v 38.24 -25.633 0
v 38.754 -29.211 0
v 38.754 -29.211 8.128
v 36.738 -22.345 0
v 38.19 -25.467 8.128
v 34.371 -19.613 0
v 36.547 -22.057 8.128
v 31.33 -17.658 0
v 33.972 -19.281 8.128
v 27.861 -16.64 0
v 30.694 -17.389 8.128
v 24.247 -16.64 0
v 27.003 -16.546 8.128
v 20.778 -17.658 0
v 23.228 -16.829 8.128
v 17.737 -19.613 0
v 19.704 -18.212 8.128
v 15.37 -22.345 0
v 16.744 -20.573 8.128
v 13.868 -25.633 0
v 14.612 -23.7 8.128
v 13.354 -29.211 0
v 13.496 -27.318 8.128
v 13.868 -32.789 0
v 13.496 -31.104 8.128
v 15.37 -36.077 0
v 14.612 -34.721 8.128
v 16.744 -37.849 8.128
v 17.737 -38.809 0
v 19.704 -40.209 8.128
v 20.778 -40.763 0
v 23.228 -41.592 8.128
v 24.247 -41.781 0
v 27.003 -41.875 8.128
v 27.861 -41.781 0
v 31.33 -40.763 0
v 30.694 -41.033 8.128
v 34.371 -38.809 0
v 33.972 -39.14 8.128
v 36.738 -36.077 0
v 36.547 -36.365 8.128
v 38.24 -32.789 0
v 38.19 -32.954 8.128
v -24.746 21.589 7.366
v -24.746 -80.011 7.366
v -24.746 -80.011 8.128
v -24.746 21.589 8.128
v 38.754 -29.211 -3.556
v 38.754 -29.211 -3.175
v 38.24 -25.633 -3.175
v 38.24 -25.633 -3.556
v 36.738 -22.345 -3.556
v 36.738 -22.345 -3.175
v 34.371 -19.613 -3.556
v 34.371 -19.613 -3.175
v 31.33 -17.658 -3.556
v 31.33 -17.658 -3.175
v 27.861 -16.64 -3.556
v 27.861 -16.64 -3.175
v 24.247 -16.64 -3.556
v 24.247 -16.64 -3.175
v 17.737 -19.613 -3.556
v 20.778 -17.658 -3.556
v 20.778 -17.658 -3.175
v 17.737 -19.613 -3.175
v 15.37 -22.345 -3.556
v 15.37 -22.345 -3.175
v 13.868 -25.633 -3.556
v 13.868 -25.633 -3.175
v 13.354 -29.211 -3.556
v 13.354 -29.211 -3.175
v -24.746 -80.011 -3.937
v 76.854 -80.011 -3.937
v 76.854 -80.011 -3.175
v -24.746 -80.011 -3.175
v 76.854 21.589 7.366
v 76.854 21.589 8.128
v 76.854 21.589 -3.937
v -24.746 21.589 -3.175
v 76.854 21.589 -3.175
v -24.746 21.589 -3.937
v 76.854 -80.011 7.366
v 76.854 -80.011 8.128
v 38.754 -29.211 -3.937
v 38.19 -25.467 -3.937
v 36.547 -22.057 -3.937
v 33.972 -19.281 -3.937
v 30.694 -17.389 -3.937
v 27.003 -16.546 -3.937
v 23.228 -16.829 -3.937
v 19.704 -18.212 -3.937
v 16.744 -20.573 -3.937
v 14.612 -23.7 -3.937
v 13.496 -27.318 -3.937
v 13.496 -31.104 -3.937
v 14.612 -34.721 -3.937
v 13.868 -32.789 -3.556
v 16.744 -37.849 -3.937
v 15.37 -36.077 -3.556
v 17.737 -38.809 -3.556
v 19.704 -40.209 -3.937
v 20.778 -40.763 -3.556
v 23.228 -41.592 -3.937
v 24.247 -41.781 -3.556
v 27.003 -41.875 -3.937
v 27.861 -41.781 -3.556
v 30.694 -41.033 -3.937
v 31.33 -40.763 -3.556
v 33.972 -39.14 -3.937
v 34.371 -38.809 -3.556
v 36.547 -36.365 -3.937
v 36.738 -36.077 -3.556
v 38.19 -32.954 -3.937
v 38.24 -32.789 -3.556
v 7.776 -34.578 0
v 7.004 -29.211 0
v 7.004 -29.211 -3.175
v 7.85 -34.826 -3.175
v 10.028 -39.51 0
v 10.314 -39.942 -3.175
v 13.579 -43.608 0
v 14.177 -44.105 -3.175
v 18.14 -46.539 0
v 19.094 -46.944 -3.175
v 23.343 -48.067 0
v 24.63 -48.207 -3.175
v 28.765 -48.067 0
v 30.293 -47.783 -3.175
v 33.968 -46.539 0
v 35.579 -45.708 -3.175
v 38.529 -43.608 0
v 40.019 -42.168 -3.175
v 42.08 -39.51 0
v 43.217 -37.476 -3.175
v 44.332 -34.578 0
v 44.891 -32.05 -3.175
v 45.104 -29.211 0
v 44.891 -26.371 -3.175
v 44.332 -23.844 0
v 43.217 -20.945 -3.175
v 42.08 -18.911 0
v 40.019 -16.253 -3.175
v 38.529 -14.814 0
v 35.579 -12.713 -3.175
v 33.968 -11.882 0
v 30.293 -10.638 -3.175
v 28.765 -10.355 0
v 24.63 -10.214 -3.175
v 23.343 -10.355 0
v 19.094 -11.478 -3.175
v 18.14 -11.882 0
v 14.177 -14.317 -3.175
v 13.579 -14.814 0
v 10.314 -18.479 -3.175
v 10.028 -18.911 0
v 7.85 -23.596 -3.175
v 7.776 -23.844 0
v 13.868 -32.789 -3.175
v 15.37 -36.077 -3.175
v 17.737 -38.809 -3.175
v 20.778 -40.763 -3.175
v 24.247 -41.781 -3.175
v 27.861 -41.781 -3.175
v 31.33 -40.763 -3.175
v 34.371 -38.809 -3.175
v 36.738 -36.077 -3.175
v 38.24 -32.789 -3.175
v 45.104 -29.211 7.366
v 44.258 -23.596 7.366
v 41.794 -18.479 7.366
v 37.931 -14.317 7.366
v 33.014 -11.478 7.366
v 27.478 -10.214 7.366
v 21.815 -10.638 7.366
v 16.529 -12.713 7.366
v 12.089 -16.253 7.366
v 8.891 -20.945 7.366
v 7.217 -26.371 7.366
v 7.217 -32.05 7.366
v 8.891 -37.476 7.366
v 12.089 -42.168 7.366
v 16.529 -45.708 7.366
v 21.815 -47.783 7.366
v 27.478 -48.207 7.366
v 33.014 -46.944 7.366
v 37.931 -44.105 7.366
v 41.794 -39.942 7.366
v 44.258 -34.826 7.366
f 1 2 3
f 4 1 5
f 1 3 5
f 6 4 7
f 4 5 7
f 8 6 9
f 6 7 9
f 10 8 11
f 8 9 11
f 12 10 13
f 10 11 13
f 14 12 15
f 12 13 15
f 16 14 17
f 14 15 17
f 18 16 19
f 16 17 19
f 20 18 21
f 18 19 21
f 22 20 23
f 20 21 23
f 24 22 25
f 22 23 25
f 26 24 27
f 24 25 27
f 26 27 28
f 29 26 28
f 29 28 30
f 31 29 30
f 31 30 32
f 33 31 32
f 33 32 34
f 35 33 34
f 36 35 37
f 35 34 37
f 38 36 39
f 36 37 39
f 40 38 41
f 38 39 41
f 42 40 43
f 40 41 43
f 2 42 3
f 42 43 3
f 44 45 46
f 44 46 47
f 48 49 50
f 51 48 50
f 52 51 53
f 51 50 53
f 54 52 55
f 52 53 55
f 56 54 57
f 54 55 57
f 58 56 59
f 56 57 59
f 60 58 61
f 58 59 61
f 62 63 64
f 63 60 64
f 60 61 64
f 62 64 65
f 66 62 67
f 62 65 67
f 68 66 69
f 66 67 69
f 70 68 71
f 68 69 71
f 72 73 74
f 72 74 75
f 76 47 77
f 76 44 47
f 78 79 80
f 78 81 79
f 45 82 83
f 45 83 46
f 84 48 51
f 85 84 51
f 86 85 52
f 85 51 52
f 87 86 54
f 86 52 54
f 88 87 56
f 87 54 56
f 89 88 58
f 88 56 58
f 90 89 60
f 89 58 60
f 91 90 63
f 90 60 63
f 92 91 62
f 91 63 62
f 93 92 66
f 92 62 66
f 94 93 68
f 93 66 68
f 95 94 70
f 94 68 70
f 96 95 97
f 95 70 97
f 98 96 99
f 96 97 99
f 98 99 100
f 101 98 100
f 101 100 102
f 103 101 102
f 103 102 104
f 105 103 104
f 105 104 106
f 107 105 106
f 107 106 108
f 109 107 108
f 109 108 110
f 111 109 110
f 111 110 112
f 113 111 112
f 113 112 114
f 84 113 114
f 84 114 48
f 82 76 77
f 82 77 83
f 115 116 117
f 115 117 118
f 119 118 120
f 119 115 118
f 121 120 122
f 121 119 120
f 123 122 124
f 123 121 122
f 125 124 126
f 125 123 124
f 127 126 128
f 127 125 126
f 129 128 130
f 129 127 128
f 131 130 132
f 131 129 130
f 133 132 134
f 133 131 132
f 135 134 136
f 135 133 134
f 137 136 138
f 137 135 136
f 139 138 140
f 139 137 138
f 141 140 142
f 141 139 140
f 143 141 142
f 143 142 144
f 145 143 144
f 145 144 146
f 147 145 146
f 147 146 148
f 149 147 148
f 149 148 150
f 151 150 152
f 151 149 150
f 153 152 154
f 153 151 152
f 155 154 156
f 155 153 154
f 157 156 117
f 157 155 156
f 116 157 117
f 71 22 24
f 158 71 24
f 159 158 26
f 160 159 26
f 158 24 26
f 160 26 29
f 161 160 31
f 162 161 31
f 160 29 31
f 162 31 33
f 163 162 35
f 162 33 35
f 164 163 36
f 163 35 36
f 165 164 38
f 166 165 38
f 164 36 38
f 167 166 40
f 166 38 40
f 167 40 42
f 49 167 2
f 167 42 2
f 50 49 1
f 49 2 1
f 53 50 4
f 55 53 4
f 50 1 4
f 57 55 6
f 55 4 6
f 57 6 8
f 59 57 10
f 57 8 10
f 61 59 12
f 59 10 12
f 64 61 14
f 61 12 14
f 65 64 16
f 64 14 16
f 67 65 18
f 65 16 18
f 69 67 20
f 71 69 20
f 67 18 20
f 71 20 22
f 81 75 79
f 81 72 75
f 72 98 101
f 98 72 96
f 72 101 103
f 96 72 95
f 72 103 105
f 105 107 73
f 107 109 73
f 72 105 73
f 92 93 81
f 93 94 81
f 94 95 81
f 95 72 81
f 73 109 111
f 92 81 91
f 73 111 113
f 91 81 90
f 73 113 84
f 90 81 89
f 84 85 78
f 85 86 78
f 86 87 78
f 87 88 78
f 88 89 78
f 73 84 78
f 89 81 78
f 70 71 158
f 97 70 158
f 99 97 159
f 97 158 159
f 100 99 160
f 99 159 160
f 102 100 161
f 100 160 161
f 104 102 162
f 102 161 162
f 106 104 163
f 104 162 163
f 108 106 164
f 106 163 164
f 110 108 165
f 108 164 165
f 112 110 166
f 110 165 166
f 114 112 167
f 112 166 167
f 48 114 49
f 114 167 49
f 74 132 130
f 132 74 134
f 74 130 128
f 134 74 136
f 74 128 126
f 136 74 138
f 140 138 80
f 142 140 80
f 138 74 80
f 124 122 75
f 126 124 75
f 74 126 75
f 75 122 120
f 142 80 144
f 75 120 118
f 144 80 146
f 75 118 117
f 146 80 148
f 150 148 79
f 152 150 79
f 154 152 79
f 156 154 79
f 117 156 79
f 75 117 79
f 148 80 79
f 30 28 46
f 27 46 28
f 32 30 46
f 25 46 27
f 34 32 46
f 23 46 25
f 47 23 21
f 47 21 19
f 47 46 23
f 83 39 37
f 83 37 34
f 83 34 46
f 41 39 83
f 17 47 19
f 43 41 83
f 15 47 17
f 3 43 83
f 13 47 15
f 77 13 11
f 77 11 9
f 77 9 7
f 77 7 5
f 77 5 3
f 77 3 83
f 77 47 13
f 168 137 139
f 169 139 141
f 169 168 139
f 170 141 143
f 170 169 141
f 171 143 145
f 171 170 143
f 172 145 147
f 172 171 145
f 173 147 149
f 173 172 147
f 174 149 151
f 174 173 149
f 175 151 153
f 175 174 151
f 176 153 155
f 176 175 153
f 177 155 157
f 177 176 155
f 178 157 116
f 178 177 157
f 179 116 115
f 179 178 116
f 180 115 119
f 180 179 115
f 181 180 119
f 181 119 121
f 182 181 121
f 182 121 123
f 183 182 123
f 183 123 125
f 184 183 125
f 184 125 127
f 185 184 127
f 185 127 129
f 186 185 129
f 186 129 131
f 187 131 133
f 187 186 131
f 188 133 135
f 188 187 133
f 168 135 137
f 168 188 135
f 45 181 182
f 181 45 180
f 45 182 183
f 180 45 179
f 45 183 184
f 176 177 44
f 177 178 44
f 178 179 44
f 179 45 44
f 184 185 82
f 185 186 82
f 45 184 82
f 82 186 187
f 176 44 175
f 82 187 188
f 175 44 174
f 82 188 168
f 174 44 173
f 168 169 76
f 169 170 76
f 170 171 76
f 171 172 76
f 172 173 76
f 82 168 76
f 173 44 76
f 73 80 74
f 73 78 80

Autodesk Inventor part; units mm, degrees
ref_plane "YZ Plane" through (0, 0, 0) normal (1, 0, 0) x (0, 1, 0)
ref_plane "XZ Plane" through (0, 0, 0) normal (0, 1, 0) x (-1, 0, 0)
ref_plane "XY Plane" through (0, 0, 0) normal (0, 0, 1) x (1, 0, 0)
sketch "Sketch1" plane through (0, 0, 0) normal (0, 0, 1) x (1, 0, 0)
  line L0 (-24.746, 21.5893) -> (76.854, 21.5893)
  line L1 (76.854, 21.5893) -> (76.854, -80.0107)
  line L2 (76.854, -80.0107) -> (-24.746, -80.0107)
  line L3 (-24.746, -80.0107) -> (-24.746, 21.5893)
  line L4 (-24.746, 21.5893) -> (76.854, -80.0107)
  line L5 (76.854, 21.5893) -> (-24.746, -80.0107)
  circle A0 centre (26.054, -29.2107) radius 12.7
  point P0 (0, 0)
  dimension "d0" = 101.6
  dimension "d1" = 101.6
  dimension "d2" = 25.4
extrude "Extrusion1" add sketch "Sketch1" along normal blind 8.128 and the other way blind 3.937
sketch "Sketch2" plane through (0, 0, 8.128) normal (0, 0, 1) x (1, 0, 0)
  line L0 (-24.746, 21.5893) -> (76.854, -80.0107)
  line L1 (76.854, 21.5893) -> (-24.746, -80.0107)
  circle A0 centre (26.054, -29.2107) radius 12.7
  point P0 (0, 0)
  dimension "d7" = 25.4
extrude "Extrusion2" cut sketch "Sketch2" against normal blind 8.128
sketch "Sketch3" plane through (-24.746, 21.5893, 8.128) normal (0, 1, 0) x (1, 0, 0)
  line L0 (101.6, 12.065) -> (101.6, 0) projected
  line L1 (101.6, 12.065) -> (0, 12.065) projected
  line L2 (0, 0) -> (0, 12.065) projected
  line L3 (0, 12.065) -> (101.6, 12.065)
  line L4 (101.6, 12.065) -> (101.6, 11.303)
  line L5 (101.6, 11.303) -> (0, 11.303)
  line L6 (0, 11.303) -> (0, 12.065)
  line L7 (101.6, 0) -> (0, 0)
  line L8 (0, 0) -> (0, 0.762)
  line L9 (0, 0.762) -> (101.6, 0.762)
  line L10 (101.6, 0.762) -> (101.6, 0)
  line L11 (0, 0.762) -> (0, 11.303)
  line L12 (101.6, 12.065) -> (101.6, 0.762)
  point P0 (24.746, 8.128)
  dimension "d10" = 0.762
  dimension "d11" = 0.762
extrude "Extrusion3" cut sketch "Sketch3" against normal blind 101.6 contours L0 L9 L2 L5
sketch "Sketch4" plane through (0, 0, 8.128) normal (0, 0, 1) x (1, 0, 0)
  circle A0 centre (26.054, -29.2107) radius 12.7 projected
  circle A1 centre (26.054, -29.2107) radius 19.05
  point P0 (0, 0)
  dimension "d14" = 38.1
extrude "Extrusion4" add sketch "Sketch4" against normal blind 8.128
sketch "Sketch5" plane through (0, 0, 8.128) normal (0, 0, 1) x (1, 0, 0)
  circle A0 centre (26.054, -29.2107) radius 12.7 projected
  point P0 (0, 0)
extrude "Extrusion5" cut sketch "Sketch5" against normal blind 25.4
sketch "Sketch6" plane through (26.054, -29.2107, 0) normal (0, 0, -1) x (-1, 0, 0)
  circle A0 centre (0, 0) radius 12.7 projected
  circle A1 centre (0, 0) radius 19.05 projected
  point P0 (26.054, 29.2107)
extrude "Extrusion6" add sketch "Sketch6" along normal blind 3.556
properties part number "lazysusanbasic"
